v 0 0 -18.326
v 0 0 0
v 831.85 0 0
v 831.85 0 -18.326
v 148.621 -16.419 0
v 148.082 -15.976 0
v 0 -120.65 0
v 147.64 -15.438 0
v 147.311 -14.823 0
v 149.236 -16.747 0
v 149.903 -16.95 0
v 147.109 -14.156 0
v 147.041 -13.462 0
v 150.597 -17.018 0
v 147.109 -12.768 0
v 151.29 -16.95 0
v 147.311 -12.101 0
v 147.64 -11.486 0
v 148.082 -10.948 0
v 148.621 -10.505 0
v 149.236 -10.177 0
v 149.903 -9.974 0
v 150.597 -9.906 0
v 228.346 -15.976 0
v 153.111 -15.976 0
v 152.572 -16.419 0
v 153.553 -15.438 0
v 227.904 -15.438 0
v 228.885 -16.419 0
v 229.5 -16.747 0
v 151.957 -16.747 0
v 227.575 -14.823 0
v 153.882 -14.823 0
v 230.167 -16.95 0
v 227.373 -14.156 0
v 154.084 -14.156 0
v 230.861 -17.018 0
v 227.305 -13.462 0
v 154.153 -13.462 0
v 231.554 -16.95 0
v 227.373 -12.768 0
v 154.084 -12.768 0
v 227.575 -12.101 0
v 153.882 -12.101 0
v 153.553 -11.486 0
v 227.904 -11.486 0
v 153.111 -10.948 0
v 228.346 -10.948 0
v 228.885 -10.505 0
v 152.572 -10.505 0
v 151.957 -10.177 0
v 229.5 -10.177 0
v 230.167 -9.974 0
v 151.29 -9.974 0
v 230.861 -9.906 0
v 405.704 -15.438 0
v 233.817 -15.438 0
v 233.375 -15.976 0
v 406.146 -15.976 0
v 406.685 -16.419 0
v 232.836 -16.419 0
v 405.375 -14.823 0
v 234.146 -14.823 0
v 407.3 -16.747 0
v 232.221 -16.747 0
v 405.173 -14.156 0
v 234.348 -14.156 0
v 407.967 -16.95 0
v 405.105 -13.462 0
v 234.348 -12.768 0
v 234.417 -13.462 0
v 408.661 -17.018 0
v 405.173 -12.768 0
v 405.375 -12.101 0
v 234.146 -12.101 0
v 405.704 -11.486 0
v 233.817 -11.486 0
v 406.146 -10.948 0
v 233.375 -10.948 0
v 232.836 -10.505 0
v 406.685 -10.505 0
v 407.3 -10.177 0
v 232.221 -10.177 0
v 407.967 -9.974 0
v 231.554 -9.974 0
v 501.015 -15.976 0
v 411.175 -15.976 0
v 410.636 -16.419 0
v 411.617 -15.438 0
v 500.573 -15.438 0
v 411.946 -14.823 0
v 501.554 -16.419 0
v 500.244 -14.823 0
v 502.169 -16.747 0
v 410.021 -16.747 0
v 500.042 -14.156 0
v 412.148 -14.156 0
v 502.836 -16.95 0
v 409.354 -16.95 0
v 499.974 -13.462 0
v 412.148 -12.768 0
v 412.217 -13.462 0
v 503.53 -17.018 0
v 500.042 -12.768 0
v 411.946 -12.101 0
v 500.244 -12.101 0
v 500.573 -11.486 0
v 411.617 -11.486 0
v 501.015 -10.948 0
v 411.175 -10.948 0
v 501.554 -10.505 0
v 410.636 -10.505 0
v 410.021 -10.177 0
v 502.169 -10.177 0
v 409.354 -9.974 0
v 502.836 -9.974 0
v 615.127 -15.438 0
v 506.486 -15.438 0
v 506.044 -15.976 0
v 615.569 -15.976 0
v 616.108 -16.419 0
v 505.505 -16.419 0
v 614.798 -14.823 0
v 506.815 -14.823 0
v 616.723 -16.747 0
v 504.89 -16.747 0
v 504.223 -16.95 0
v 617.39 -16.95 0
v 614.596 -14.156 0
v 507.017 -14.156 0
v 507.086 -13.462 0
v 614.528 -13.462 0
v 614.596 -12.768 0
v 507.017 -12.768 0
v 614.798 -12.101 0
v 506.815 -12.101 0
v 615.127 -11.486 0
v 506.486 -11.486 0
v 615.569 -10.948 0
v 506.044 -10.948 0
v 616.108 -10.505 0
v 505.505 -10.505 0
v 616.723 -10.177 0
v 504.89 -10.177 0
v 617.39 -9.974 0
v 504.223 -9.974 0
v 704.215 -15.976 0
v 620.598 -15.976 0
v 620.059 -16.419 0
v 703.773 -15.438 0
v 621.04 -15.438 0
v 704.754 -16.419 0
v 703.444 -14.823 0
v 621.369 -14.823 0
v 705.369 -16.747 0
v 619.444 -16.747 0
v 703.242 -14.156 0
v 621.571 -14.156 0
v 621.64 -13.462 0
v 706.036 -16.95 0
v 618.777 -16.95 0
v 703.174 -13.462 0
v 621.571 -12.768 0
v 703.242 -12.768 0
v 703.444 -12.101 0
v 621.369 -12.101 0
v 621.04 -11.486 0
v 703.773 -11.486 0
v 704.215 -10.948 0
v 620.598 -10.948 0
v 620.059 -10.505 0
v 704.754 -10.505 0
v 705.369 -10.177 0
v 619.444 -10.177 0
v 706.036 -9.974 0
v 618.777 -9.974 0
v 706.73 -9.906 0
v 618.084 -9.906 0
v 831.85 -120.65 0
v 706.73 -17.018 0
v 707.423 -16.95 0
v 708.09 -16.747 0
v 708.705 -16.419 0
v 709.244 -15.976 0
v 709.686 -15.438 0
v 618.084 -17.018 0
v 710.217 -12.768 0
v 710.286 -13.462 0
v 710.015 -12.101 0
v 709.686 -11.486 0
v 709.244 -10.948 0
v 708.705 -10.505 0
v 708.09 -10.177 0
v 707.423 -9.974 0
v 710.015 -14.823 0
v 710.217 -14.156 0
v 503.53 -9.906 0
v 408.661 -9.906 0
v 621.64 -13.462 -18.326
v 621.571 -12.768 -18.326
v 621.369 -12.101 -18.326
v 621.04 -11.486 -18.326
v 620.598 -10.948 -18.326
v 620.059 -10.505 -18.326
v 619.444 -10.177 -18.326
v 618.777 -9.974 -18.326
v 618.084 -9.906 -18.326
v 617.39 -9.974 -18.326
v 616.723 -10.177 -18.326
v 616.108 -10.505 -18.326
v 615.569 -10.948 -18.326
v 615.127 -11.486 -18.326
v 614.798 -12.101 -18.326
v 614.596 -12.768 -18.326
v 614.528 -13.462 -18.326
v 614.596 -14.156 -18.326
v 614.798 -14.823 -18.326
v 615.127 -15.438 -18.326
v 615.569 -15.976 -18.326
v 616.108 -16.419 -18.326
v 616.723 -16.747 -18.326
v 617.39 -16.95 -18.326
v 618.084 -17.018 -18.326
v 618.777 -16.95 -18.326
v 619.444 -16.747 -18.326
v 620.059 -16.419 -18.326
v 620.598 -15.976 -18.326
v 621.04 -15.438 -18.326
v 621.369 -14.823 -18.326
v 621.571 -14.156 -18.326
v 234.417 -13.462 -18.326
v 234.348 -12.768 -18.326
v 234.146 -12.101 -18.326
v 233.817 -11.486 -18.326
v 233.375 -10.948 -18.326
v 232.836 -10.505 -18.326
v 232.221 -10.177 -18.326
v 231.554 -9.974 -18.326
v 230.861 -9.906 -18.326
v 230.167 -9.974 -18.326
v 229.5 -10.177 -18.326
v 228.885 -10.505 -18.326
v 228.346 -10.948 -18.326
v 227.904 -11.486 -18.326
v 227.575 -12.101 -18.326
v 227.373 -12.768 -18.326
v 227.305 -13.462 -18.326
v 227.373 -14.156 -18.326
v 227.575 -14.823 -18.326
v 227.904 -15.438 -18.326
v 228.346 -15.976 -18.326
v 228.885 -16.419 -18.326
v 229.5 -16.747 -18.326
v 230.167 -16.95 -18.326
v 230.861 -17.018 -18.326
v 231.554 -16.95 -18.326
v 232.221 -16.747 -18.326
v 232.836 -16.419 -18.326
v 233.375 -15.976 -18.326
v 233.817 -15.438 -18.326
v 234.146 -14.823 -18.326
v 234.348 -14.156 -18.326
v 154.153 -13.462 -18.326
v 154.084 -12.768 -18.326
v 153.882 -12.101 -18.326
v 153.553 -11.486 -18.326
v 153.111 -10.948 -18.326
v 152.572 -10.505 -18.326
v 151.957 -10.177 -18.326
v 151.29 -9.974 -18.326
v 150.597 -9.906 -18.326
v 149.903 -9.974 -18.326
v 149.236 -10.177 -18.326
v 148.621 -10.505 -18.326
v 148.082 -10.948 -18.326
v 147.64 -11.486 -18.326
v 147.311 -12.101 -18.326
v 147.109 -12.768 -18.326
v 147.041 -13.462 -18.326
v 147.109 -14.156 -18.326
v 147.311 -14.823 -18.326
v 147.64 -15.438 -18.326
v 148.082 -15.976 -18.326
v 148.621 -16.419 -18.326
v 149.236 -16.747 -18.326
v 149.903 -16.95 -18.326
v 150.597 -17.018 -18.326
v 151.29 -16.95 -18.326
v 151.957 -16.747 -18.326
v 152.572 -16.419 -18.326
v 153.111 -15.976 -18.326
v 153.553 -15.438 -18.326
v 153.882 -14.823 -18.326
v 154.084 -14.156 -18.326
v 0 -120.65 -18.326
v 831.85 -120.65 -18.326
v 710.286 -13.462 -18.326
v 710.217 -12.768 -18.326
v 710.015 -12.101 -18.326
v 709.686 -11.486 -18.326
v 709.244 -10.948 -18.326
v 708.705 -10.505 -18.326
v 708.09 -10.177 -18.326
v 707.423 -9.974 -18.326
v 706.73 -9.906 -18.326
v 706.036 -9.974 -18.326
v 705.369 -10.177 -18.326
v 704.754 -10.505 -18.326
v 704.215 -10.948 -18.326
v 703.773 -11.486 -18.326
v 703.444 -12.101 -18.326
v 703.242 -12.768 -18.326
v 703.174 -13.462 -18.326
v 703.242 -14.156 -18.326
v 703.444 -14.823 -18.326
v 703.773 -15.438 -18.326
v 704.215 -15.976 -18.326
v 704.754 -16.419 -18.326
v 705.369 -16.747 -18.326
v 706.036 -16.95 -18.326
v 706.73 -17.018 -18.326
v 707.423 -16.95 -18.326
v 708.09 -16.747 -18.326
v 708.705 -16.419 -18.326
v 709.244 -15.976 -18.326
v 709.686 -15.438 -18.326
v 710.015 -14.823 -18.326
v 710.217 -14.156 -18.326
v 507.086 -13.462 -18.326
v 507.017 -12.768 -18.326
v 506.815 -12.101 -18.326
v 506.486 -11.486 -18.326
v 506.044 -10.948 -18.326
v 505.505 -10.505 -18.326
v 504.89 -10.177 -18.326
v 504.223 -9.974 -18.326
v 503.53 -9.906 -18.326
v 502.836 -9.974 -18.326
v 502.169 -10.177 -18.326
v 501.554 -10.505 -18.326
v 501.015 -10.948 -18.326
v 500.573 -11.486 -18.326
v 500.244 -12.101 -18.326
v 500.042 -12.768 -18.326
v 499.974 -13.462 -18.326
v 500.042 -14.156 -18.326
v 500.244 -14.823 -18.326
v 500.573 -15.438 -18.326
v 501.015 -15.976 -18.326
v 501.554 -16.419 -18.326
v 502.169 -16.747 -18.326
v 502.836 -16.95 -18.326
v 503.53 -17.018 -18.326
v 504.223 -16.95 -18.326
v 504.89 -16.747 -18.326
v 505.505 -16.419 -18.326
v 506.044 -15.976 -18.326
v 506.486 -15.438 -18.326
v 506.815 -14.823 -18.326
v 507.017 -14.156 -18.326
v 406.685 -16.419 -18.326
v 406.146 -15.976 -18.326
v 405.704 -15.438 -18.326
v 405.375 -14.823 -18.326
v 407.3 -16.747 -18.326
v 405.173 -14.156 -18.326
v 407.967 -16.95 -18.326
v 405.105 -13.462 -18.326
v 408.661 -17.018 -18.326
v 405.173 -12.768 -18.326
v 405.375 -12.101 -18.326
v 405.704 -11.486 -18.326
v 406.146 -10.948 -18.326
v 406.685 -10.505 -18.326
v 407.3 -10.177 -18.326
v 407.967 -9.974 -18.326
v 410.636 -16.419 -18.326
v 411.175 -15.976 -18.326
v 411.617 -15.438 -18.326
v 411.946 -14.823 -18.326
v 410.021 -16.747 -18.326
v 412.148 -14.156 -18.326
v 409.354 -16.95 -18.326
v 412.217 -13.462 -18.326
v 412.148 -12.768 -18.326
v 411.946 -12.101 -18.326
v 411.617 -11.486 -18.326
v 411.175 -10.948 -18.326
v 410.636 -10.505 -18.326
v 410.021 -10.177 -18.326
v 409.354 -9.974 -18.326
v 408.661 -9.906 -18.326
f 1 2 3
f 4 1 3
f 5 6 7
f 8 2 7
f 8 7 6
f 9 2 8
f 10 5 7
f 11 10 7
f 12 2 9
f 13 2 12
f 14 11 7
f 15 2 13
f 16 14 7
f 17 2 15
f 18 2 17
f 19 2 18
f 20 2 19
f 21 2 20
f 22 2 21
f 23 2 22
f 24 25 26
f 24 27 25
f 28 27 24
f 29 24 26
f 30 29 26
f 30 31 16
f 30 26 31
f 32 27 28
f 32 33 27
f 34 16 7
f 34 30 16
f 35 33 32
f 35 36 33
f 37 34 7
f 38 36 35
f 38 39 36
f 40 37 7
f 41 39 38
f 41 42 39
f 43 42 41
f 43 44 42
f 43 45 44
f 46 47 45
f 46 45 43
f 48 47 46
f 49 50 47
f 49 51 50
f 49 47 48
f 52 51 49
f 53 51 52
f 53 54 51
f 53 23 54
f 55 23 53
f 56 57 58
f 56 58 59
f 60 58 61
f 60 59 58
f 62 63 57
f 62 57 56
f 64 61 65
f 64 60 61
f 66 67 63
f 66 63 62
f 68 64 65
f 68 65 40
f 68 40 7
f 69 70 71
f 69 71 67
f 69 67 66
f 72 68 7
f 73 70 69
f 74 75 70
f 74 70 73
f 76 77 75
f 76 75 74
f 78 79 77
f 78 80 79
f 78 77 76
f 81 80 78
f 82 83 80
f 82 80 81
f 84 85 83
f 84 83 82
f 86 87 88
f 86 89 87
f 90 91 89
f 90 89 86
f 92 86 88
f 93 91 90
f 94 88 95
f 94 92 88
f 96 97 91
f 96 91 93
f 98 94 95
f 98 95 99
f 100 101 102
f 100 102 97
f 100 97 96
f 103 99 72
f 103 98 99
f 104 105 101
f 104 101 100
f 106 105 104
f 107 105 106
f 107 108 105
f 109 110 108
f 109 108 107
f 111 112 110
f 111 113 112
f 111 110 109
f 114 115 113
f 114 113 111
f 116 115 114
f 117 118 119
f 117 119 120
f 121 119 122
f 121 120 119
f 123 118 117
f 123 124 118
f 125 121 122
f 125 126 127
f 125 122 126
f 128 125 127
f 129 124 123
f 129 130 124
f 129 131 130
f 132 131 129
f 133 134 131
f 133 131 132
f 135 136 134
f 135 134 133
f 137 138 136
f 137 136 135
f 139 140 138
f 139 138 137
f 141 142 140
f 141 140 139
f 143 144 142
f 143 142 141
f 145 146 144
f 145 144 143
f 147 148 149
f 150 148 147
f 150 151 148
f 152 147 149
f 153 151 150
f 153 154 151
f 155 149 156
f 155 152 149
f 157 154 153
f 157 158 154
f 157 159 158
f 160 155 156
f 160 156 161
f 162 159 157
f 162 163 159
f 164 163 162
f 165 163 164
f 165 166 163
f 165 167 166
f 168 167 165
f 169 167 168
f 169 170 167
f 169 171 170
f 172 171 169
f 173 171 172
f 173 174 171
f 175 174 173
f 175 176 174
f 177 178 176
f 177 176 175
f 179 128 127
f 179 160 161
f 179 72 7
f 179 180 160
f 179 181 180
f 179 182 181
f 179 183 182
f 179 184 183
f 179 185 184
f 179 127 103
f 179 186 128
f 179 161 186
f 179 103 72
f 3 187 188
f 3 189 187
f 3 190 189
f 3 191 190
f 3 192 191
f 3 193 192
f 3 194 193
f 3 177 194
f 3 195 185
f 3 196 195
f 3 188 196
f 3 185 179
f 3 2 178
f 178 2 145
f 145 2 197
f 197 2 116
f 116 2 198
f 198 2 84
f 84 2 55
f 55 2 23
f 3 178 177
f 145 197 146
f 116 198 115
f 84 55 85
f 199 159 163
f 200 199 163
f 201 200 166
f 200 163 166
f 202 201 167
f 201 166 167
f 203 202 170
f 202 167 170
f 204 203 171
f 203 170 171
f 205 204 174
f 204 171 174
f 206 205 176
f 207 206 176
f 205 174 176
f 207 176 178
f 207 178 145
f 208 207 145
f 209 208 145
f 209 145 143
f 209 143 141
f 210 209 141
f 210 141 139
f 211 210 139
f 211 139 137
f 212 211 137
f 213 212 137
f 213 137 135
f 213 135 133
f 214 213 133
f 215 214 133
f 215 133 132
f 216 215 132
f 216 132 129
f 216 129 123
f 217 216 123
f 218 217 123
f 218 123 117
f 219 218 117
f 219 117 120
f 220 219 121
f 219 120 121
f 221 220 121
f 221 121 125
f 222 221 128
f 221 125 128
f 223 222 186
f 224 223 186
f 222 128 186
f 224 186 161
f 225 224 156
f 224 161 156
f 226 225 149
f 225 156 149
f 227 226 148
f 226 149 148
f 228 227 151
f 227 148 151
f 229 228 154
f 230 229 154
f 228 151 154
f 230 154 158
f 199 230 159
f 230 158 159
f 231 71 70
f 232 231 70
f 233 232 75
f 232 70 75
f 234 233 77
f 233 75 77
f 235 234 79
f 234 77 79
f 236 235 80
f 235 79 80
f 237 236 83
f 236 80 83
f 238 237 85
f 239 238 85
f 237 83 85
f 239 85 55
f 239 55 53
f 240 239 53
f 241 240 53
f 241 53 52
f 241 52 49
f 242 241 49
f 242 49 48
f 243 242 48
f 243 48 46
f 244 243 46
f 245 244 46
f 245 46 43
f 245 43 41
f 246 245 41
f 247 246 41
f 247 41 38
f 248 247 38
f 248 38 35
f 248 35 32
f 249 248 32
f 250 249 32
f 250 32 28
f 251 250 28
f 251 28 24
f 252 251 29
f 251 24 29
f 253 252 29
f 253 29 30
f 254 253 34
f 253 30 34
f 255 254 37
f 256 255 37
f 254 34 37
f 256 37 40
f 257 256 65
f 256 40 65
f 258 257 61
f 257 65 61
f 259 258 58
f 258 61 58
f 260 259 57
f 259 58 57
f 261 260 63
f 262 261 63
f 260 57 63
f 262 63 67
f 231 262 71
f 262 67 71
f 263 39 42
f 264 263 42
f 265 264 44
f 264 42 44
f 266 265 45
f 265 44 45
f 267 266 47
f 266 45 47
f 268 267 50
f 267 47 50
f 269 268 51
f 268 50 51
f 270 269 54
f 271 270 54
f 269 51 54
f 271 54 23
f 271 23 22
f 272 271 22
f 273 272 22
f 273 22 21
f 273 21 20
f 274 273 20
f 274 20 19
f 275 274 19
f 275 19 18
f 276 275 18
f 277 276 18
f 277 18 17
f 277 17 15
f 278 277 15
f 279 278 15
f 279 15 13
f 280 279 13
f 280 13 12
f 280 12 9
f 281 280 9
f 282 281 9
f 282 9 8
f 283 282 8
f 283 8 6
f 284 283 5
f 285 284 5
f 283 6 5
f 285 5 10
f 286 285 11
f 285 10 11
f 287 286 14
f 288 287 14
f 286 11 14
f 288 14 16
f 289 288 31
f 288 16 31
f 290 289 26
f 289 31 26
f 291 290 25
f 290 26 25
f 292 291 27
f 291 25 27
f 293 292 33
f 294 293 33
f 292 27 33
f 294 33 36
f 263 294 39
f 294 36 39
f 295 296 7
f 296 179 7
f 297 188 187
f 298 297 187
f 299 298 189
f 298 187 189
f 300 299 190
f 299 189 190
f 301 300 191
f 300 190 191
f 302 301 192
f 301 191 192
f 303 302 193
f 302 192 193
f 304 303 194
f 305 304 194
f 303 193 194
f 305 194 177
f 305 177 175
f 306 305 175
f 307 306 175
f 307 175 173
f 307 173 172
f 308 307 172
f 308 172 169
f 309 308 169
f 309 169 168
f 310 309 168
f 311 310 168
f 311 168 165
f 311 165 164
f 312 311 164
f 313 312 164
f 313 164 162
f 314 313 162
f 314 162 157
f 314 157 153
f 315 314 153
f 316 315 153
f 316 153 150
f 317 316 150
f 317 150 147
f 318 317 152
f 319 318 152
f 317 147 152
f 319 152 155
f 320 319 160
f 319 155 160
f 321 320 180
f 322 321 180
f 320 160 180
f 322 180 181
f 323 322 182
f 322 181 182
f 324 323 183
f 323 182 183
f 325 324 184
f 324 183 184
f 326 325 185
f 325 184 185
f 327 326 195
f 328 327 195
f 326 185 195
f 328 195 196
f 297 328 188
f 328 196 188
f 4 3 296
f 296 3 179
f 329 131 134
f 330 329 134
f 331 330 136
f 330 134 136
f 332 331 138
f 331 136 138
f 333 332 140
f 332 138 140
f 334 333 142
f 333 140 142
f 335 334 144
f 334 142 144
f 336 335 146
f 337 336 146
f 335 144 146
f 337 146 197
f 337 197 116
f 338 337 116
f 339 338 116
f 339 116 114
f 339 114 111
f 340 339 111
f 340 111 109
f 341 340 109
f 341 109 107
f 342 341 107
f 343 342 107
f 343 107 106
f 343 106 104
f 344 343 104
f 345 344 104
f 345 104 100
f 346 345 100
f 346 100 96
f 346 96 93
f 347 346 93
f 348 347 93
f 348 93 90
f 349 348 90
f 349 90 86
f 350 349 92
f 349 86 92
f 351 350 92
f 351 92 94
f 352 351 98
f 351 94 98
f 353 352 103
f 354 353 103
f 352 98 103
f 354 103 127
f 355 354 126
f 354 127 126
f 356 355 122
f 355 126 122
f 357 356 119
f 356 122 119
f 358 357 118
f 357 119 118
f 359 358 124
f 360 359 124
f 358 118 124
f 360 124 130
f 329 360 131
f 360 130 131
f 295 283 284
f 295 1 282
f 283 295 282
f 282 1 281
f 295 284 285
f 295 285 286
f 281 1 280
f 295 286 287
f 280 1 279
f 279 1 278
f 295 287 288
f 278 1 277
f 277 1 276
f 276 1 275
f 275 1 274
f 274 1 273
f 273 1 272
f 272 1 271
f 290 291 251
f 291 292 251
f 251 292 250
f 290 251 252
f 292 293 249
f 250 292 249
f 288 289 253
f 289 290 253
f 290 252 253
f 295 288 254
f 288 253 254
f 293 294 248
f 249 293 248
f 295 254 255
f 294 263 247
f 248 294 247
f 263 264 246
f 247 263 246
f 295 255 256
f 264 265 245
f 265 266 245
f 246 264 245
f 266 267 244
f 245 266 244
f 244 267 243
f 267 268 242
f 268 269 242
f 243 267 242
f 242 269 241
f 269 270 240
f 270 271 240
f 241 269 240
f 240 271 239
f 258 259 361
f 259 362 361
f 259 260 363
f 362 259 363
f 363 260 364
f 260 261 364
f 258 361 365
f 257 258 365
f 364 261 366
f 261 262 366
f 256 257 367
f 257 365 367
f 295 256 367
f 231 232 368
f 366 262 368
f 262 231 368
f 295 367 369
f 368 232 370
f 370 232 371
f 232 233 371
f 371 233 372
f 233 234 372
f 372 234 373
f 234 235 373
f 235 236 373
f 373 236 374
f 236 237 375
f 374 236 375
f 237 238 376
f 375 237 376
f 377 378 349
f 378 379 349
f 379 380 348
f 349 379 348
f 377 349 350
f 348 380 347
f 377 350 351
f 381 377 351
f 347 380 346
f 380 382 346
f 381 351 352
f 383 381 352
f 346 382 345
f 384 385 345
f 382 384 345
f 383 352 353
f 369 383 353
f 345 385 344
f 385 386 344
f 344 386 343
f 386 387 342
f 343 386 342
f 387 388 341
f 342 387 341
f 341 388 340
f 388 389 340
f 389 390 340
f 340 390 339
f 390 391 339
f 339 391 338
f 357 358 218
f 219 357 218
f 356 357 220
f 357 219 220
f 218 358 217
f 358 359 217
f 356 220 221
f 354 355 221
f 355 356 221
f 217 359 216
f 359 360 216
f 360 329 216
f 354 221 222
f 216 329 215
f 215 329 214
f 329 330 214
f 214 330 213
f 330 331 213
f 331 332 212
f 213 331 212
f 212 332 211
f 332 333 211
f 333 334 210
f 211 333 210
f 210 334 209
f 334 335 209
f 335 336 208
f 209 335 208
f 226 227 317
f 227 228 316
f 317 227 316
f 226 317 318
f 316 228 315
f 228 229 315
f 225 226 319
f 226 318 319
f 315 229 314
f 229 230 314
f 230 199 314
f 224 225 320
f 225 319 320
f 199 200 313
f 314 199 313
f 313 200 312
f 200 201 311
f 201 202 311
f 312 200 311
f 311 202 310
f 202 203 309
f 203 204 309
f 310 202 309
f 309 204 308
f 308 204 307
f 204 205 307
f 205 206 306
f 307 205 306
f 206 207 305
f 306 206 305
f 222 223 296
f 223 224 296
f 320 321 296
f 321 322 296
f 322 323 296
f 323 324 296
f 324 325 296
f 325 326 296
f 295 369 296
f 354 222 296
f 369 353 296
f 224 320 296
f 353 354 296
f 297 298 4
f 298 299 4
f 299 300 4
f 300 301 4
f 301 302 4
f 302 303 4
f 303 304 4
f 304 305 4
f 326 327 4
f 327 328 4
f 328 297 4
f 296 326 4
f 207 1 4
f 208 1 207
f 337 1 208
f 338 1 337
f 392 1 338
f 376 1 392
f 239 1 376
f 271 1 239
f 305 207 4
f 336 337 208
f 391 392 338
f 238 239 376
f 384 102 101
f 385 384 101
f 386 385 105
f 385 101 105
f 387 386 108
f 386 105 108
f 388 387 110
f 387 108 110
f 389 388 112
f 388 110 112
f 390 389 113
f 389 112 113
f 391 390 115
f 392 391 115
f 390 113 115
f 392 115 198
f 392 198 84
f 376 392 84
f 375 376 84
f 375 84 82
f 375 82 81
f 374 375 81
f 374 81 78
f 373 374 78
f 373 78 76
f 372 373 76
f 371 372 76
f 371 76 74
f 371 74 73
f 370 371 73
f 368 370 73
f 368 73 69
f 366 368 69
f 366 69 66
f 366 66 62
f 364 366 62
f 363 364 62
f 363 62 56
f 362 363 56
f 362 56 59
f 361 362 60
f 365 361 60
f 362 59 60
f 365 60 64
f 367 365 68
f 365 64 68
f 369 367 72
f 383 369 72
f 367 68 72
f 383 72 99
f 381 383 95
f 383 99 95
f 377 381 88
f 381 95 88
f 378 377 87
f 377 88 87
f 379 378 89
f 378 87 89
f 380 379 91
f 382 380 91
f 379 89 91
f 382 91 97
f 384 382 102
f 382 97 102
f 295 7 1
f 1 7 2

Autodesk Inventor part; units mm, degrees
ref_plane "YZ Plane" through (0, 0, 0) normal (1, 0, 0) x (0, 1, 0)
ref_plane "XZ Plane" through (0, 0, 0) normal (0, 1, 0) x (-1, 0, 0)
ref_plane "XY Plane" through (0, 0, 0) normal (0, 0, 1) x (1, 0, 0)
sketch "Sketch1" plane through (0, 0, 0) normal (0, 0, 1) x (1, 0, 0)
  line L0 (0, 0) -> (831.85, 0)
  line L1 (831.85, 0) -> (831.85, -120.65)
  line L2 (831.85, -120.65) -> (0, -120.65)
  line L3 (0, -120.65) -> (0, 0)
  circle A0 centre (150.5966, -13.462) radius 3.556
  circle A1 centre (230.8606, -13.462) radius 3.556
  circle A2 centre (408.6606, -13.462) radius 3.556
  circle A3 centre (503.5296, -13.462) radius 3.556
  circle A4 centre (618.0836, -13.462) radius 3.556
  circle A5 centre (706.7296, -13.462) radius 3.556
  dimension "d0" = 831.85
  dimension "d1" = 120.65
  dimension "d2" = 7.112
  dimension "d3" = 150.5966
  dimension "d4" = 107.188
  dimension "d5" = 7.112
  dimension "d6" = 80.264
  dimension "d7" = 107.188
  dimension "d8" = 7.112
  dimension "d9" = 107.188
  dimension "d10" = 177.8
  dimension "d11" = 7.112
  dimension "d12" = 107.188
  dimension "d13" = 94.869
  dimension "d14" = 7.112
  dimension "d15" = 107.188
  dimension "d16" = 114.554
  dimension "d17" = 7.112
  dimension "d19" = 88.646
  dimension "d20" = 107.188
extrude "Extrusion1" add sketch "Sketch1" against normal blind 18.3261
properties part number "Kermit bumper (middle 4)"
